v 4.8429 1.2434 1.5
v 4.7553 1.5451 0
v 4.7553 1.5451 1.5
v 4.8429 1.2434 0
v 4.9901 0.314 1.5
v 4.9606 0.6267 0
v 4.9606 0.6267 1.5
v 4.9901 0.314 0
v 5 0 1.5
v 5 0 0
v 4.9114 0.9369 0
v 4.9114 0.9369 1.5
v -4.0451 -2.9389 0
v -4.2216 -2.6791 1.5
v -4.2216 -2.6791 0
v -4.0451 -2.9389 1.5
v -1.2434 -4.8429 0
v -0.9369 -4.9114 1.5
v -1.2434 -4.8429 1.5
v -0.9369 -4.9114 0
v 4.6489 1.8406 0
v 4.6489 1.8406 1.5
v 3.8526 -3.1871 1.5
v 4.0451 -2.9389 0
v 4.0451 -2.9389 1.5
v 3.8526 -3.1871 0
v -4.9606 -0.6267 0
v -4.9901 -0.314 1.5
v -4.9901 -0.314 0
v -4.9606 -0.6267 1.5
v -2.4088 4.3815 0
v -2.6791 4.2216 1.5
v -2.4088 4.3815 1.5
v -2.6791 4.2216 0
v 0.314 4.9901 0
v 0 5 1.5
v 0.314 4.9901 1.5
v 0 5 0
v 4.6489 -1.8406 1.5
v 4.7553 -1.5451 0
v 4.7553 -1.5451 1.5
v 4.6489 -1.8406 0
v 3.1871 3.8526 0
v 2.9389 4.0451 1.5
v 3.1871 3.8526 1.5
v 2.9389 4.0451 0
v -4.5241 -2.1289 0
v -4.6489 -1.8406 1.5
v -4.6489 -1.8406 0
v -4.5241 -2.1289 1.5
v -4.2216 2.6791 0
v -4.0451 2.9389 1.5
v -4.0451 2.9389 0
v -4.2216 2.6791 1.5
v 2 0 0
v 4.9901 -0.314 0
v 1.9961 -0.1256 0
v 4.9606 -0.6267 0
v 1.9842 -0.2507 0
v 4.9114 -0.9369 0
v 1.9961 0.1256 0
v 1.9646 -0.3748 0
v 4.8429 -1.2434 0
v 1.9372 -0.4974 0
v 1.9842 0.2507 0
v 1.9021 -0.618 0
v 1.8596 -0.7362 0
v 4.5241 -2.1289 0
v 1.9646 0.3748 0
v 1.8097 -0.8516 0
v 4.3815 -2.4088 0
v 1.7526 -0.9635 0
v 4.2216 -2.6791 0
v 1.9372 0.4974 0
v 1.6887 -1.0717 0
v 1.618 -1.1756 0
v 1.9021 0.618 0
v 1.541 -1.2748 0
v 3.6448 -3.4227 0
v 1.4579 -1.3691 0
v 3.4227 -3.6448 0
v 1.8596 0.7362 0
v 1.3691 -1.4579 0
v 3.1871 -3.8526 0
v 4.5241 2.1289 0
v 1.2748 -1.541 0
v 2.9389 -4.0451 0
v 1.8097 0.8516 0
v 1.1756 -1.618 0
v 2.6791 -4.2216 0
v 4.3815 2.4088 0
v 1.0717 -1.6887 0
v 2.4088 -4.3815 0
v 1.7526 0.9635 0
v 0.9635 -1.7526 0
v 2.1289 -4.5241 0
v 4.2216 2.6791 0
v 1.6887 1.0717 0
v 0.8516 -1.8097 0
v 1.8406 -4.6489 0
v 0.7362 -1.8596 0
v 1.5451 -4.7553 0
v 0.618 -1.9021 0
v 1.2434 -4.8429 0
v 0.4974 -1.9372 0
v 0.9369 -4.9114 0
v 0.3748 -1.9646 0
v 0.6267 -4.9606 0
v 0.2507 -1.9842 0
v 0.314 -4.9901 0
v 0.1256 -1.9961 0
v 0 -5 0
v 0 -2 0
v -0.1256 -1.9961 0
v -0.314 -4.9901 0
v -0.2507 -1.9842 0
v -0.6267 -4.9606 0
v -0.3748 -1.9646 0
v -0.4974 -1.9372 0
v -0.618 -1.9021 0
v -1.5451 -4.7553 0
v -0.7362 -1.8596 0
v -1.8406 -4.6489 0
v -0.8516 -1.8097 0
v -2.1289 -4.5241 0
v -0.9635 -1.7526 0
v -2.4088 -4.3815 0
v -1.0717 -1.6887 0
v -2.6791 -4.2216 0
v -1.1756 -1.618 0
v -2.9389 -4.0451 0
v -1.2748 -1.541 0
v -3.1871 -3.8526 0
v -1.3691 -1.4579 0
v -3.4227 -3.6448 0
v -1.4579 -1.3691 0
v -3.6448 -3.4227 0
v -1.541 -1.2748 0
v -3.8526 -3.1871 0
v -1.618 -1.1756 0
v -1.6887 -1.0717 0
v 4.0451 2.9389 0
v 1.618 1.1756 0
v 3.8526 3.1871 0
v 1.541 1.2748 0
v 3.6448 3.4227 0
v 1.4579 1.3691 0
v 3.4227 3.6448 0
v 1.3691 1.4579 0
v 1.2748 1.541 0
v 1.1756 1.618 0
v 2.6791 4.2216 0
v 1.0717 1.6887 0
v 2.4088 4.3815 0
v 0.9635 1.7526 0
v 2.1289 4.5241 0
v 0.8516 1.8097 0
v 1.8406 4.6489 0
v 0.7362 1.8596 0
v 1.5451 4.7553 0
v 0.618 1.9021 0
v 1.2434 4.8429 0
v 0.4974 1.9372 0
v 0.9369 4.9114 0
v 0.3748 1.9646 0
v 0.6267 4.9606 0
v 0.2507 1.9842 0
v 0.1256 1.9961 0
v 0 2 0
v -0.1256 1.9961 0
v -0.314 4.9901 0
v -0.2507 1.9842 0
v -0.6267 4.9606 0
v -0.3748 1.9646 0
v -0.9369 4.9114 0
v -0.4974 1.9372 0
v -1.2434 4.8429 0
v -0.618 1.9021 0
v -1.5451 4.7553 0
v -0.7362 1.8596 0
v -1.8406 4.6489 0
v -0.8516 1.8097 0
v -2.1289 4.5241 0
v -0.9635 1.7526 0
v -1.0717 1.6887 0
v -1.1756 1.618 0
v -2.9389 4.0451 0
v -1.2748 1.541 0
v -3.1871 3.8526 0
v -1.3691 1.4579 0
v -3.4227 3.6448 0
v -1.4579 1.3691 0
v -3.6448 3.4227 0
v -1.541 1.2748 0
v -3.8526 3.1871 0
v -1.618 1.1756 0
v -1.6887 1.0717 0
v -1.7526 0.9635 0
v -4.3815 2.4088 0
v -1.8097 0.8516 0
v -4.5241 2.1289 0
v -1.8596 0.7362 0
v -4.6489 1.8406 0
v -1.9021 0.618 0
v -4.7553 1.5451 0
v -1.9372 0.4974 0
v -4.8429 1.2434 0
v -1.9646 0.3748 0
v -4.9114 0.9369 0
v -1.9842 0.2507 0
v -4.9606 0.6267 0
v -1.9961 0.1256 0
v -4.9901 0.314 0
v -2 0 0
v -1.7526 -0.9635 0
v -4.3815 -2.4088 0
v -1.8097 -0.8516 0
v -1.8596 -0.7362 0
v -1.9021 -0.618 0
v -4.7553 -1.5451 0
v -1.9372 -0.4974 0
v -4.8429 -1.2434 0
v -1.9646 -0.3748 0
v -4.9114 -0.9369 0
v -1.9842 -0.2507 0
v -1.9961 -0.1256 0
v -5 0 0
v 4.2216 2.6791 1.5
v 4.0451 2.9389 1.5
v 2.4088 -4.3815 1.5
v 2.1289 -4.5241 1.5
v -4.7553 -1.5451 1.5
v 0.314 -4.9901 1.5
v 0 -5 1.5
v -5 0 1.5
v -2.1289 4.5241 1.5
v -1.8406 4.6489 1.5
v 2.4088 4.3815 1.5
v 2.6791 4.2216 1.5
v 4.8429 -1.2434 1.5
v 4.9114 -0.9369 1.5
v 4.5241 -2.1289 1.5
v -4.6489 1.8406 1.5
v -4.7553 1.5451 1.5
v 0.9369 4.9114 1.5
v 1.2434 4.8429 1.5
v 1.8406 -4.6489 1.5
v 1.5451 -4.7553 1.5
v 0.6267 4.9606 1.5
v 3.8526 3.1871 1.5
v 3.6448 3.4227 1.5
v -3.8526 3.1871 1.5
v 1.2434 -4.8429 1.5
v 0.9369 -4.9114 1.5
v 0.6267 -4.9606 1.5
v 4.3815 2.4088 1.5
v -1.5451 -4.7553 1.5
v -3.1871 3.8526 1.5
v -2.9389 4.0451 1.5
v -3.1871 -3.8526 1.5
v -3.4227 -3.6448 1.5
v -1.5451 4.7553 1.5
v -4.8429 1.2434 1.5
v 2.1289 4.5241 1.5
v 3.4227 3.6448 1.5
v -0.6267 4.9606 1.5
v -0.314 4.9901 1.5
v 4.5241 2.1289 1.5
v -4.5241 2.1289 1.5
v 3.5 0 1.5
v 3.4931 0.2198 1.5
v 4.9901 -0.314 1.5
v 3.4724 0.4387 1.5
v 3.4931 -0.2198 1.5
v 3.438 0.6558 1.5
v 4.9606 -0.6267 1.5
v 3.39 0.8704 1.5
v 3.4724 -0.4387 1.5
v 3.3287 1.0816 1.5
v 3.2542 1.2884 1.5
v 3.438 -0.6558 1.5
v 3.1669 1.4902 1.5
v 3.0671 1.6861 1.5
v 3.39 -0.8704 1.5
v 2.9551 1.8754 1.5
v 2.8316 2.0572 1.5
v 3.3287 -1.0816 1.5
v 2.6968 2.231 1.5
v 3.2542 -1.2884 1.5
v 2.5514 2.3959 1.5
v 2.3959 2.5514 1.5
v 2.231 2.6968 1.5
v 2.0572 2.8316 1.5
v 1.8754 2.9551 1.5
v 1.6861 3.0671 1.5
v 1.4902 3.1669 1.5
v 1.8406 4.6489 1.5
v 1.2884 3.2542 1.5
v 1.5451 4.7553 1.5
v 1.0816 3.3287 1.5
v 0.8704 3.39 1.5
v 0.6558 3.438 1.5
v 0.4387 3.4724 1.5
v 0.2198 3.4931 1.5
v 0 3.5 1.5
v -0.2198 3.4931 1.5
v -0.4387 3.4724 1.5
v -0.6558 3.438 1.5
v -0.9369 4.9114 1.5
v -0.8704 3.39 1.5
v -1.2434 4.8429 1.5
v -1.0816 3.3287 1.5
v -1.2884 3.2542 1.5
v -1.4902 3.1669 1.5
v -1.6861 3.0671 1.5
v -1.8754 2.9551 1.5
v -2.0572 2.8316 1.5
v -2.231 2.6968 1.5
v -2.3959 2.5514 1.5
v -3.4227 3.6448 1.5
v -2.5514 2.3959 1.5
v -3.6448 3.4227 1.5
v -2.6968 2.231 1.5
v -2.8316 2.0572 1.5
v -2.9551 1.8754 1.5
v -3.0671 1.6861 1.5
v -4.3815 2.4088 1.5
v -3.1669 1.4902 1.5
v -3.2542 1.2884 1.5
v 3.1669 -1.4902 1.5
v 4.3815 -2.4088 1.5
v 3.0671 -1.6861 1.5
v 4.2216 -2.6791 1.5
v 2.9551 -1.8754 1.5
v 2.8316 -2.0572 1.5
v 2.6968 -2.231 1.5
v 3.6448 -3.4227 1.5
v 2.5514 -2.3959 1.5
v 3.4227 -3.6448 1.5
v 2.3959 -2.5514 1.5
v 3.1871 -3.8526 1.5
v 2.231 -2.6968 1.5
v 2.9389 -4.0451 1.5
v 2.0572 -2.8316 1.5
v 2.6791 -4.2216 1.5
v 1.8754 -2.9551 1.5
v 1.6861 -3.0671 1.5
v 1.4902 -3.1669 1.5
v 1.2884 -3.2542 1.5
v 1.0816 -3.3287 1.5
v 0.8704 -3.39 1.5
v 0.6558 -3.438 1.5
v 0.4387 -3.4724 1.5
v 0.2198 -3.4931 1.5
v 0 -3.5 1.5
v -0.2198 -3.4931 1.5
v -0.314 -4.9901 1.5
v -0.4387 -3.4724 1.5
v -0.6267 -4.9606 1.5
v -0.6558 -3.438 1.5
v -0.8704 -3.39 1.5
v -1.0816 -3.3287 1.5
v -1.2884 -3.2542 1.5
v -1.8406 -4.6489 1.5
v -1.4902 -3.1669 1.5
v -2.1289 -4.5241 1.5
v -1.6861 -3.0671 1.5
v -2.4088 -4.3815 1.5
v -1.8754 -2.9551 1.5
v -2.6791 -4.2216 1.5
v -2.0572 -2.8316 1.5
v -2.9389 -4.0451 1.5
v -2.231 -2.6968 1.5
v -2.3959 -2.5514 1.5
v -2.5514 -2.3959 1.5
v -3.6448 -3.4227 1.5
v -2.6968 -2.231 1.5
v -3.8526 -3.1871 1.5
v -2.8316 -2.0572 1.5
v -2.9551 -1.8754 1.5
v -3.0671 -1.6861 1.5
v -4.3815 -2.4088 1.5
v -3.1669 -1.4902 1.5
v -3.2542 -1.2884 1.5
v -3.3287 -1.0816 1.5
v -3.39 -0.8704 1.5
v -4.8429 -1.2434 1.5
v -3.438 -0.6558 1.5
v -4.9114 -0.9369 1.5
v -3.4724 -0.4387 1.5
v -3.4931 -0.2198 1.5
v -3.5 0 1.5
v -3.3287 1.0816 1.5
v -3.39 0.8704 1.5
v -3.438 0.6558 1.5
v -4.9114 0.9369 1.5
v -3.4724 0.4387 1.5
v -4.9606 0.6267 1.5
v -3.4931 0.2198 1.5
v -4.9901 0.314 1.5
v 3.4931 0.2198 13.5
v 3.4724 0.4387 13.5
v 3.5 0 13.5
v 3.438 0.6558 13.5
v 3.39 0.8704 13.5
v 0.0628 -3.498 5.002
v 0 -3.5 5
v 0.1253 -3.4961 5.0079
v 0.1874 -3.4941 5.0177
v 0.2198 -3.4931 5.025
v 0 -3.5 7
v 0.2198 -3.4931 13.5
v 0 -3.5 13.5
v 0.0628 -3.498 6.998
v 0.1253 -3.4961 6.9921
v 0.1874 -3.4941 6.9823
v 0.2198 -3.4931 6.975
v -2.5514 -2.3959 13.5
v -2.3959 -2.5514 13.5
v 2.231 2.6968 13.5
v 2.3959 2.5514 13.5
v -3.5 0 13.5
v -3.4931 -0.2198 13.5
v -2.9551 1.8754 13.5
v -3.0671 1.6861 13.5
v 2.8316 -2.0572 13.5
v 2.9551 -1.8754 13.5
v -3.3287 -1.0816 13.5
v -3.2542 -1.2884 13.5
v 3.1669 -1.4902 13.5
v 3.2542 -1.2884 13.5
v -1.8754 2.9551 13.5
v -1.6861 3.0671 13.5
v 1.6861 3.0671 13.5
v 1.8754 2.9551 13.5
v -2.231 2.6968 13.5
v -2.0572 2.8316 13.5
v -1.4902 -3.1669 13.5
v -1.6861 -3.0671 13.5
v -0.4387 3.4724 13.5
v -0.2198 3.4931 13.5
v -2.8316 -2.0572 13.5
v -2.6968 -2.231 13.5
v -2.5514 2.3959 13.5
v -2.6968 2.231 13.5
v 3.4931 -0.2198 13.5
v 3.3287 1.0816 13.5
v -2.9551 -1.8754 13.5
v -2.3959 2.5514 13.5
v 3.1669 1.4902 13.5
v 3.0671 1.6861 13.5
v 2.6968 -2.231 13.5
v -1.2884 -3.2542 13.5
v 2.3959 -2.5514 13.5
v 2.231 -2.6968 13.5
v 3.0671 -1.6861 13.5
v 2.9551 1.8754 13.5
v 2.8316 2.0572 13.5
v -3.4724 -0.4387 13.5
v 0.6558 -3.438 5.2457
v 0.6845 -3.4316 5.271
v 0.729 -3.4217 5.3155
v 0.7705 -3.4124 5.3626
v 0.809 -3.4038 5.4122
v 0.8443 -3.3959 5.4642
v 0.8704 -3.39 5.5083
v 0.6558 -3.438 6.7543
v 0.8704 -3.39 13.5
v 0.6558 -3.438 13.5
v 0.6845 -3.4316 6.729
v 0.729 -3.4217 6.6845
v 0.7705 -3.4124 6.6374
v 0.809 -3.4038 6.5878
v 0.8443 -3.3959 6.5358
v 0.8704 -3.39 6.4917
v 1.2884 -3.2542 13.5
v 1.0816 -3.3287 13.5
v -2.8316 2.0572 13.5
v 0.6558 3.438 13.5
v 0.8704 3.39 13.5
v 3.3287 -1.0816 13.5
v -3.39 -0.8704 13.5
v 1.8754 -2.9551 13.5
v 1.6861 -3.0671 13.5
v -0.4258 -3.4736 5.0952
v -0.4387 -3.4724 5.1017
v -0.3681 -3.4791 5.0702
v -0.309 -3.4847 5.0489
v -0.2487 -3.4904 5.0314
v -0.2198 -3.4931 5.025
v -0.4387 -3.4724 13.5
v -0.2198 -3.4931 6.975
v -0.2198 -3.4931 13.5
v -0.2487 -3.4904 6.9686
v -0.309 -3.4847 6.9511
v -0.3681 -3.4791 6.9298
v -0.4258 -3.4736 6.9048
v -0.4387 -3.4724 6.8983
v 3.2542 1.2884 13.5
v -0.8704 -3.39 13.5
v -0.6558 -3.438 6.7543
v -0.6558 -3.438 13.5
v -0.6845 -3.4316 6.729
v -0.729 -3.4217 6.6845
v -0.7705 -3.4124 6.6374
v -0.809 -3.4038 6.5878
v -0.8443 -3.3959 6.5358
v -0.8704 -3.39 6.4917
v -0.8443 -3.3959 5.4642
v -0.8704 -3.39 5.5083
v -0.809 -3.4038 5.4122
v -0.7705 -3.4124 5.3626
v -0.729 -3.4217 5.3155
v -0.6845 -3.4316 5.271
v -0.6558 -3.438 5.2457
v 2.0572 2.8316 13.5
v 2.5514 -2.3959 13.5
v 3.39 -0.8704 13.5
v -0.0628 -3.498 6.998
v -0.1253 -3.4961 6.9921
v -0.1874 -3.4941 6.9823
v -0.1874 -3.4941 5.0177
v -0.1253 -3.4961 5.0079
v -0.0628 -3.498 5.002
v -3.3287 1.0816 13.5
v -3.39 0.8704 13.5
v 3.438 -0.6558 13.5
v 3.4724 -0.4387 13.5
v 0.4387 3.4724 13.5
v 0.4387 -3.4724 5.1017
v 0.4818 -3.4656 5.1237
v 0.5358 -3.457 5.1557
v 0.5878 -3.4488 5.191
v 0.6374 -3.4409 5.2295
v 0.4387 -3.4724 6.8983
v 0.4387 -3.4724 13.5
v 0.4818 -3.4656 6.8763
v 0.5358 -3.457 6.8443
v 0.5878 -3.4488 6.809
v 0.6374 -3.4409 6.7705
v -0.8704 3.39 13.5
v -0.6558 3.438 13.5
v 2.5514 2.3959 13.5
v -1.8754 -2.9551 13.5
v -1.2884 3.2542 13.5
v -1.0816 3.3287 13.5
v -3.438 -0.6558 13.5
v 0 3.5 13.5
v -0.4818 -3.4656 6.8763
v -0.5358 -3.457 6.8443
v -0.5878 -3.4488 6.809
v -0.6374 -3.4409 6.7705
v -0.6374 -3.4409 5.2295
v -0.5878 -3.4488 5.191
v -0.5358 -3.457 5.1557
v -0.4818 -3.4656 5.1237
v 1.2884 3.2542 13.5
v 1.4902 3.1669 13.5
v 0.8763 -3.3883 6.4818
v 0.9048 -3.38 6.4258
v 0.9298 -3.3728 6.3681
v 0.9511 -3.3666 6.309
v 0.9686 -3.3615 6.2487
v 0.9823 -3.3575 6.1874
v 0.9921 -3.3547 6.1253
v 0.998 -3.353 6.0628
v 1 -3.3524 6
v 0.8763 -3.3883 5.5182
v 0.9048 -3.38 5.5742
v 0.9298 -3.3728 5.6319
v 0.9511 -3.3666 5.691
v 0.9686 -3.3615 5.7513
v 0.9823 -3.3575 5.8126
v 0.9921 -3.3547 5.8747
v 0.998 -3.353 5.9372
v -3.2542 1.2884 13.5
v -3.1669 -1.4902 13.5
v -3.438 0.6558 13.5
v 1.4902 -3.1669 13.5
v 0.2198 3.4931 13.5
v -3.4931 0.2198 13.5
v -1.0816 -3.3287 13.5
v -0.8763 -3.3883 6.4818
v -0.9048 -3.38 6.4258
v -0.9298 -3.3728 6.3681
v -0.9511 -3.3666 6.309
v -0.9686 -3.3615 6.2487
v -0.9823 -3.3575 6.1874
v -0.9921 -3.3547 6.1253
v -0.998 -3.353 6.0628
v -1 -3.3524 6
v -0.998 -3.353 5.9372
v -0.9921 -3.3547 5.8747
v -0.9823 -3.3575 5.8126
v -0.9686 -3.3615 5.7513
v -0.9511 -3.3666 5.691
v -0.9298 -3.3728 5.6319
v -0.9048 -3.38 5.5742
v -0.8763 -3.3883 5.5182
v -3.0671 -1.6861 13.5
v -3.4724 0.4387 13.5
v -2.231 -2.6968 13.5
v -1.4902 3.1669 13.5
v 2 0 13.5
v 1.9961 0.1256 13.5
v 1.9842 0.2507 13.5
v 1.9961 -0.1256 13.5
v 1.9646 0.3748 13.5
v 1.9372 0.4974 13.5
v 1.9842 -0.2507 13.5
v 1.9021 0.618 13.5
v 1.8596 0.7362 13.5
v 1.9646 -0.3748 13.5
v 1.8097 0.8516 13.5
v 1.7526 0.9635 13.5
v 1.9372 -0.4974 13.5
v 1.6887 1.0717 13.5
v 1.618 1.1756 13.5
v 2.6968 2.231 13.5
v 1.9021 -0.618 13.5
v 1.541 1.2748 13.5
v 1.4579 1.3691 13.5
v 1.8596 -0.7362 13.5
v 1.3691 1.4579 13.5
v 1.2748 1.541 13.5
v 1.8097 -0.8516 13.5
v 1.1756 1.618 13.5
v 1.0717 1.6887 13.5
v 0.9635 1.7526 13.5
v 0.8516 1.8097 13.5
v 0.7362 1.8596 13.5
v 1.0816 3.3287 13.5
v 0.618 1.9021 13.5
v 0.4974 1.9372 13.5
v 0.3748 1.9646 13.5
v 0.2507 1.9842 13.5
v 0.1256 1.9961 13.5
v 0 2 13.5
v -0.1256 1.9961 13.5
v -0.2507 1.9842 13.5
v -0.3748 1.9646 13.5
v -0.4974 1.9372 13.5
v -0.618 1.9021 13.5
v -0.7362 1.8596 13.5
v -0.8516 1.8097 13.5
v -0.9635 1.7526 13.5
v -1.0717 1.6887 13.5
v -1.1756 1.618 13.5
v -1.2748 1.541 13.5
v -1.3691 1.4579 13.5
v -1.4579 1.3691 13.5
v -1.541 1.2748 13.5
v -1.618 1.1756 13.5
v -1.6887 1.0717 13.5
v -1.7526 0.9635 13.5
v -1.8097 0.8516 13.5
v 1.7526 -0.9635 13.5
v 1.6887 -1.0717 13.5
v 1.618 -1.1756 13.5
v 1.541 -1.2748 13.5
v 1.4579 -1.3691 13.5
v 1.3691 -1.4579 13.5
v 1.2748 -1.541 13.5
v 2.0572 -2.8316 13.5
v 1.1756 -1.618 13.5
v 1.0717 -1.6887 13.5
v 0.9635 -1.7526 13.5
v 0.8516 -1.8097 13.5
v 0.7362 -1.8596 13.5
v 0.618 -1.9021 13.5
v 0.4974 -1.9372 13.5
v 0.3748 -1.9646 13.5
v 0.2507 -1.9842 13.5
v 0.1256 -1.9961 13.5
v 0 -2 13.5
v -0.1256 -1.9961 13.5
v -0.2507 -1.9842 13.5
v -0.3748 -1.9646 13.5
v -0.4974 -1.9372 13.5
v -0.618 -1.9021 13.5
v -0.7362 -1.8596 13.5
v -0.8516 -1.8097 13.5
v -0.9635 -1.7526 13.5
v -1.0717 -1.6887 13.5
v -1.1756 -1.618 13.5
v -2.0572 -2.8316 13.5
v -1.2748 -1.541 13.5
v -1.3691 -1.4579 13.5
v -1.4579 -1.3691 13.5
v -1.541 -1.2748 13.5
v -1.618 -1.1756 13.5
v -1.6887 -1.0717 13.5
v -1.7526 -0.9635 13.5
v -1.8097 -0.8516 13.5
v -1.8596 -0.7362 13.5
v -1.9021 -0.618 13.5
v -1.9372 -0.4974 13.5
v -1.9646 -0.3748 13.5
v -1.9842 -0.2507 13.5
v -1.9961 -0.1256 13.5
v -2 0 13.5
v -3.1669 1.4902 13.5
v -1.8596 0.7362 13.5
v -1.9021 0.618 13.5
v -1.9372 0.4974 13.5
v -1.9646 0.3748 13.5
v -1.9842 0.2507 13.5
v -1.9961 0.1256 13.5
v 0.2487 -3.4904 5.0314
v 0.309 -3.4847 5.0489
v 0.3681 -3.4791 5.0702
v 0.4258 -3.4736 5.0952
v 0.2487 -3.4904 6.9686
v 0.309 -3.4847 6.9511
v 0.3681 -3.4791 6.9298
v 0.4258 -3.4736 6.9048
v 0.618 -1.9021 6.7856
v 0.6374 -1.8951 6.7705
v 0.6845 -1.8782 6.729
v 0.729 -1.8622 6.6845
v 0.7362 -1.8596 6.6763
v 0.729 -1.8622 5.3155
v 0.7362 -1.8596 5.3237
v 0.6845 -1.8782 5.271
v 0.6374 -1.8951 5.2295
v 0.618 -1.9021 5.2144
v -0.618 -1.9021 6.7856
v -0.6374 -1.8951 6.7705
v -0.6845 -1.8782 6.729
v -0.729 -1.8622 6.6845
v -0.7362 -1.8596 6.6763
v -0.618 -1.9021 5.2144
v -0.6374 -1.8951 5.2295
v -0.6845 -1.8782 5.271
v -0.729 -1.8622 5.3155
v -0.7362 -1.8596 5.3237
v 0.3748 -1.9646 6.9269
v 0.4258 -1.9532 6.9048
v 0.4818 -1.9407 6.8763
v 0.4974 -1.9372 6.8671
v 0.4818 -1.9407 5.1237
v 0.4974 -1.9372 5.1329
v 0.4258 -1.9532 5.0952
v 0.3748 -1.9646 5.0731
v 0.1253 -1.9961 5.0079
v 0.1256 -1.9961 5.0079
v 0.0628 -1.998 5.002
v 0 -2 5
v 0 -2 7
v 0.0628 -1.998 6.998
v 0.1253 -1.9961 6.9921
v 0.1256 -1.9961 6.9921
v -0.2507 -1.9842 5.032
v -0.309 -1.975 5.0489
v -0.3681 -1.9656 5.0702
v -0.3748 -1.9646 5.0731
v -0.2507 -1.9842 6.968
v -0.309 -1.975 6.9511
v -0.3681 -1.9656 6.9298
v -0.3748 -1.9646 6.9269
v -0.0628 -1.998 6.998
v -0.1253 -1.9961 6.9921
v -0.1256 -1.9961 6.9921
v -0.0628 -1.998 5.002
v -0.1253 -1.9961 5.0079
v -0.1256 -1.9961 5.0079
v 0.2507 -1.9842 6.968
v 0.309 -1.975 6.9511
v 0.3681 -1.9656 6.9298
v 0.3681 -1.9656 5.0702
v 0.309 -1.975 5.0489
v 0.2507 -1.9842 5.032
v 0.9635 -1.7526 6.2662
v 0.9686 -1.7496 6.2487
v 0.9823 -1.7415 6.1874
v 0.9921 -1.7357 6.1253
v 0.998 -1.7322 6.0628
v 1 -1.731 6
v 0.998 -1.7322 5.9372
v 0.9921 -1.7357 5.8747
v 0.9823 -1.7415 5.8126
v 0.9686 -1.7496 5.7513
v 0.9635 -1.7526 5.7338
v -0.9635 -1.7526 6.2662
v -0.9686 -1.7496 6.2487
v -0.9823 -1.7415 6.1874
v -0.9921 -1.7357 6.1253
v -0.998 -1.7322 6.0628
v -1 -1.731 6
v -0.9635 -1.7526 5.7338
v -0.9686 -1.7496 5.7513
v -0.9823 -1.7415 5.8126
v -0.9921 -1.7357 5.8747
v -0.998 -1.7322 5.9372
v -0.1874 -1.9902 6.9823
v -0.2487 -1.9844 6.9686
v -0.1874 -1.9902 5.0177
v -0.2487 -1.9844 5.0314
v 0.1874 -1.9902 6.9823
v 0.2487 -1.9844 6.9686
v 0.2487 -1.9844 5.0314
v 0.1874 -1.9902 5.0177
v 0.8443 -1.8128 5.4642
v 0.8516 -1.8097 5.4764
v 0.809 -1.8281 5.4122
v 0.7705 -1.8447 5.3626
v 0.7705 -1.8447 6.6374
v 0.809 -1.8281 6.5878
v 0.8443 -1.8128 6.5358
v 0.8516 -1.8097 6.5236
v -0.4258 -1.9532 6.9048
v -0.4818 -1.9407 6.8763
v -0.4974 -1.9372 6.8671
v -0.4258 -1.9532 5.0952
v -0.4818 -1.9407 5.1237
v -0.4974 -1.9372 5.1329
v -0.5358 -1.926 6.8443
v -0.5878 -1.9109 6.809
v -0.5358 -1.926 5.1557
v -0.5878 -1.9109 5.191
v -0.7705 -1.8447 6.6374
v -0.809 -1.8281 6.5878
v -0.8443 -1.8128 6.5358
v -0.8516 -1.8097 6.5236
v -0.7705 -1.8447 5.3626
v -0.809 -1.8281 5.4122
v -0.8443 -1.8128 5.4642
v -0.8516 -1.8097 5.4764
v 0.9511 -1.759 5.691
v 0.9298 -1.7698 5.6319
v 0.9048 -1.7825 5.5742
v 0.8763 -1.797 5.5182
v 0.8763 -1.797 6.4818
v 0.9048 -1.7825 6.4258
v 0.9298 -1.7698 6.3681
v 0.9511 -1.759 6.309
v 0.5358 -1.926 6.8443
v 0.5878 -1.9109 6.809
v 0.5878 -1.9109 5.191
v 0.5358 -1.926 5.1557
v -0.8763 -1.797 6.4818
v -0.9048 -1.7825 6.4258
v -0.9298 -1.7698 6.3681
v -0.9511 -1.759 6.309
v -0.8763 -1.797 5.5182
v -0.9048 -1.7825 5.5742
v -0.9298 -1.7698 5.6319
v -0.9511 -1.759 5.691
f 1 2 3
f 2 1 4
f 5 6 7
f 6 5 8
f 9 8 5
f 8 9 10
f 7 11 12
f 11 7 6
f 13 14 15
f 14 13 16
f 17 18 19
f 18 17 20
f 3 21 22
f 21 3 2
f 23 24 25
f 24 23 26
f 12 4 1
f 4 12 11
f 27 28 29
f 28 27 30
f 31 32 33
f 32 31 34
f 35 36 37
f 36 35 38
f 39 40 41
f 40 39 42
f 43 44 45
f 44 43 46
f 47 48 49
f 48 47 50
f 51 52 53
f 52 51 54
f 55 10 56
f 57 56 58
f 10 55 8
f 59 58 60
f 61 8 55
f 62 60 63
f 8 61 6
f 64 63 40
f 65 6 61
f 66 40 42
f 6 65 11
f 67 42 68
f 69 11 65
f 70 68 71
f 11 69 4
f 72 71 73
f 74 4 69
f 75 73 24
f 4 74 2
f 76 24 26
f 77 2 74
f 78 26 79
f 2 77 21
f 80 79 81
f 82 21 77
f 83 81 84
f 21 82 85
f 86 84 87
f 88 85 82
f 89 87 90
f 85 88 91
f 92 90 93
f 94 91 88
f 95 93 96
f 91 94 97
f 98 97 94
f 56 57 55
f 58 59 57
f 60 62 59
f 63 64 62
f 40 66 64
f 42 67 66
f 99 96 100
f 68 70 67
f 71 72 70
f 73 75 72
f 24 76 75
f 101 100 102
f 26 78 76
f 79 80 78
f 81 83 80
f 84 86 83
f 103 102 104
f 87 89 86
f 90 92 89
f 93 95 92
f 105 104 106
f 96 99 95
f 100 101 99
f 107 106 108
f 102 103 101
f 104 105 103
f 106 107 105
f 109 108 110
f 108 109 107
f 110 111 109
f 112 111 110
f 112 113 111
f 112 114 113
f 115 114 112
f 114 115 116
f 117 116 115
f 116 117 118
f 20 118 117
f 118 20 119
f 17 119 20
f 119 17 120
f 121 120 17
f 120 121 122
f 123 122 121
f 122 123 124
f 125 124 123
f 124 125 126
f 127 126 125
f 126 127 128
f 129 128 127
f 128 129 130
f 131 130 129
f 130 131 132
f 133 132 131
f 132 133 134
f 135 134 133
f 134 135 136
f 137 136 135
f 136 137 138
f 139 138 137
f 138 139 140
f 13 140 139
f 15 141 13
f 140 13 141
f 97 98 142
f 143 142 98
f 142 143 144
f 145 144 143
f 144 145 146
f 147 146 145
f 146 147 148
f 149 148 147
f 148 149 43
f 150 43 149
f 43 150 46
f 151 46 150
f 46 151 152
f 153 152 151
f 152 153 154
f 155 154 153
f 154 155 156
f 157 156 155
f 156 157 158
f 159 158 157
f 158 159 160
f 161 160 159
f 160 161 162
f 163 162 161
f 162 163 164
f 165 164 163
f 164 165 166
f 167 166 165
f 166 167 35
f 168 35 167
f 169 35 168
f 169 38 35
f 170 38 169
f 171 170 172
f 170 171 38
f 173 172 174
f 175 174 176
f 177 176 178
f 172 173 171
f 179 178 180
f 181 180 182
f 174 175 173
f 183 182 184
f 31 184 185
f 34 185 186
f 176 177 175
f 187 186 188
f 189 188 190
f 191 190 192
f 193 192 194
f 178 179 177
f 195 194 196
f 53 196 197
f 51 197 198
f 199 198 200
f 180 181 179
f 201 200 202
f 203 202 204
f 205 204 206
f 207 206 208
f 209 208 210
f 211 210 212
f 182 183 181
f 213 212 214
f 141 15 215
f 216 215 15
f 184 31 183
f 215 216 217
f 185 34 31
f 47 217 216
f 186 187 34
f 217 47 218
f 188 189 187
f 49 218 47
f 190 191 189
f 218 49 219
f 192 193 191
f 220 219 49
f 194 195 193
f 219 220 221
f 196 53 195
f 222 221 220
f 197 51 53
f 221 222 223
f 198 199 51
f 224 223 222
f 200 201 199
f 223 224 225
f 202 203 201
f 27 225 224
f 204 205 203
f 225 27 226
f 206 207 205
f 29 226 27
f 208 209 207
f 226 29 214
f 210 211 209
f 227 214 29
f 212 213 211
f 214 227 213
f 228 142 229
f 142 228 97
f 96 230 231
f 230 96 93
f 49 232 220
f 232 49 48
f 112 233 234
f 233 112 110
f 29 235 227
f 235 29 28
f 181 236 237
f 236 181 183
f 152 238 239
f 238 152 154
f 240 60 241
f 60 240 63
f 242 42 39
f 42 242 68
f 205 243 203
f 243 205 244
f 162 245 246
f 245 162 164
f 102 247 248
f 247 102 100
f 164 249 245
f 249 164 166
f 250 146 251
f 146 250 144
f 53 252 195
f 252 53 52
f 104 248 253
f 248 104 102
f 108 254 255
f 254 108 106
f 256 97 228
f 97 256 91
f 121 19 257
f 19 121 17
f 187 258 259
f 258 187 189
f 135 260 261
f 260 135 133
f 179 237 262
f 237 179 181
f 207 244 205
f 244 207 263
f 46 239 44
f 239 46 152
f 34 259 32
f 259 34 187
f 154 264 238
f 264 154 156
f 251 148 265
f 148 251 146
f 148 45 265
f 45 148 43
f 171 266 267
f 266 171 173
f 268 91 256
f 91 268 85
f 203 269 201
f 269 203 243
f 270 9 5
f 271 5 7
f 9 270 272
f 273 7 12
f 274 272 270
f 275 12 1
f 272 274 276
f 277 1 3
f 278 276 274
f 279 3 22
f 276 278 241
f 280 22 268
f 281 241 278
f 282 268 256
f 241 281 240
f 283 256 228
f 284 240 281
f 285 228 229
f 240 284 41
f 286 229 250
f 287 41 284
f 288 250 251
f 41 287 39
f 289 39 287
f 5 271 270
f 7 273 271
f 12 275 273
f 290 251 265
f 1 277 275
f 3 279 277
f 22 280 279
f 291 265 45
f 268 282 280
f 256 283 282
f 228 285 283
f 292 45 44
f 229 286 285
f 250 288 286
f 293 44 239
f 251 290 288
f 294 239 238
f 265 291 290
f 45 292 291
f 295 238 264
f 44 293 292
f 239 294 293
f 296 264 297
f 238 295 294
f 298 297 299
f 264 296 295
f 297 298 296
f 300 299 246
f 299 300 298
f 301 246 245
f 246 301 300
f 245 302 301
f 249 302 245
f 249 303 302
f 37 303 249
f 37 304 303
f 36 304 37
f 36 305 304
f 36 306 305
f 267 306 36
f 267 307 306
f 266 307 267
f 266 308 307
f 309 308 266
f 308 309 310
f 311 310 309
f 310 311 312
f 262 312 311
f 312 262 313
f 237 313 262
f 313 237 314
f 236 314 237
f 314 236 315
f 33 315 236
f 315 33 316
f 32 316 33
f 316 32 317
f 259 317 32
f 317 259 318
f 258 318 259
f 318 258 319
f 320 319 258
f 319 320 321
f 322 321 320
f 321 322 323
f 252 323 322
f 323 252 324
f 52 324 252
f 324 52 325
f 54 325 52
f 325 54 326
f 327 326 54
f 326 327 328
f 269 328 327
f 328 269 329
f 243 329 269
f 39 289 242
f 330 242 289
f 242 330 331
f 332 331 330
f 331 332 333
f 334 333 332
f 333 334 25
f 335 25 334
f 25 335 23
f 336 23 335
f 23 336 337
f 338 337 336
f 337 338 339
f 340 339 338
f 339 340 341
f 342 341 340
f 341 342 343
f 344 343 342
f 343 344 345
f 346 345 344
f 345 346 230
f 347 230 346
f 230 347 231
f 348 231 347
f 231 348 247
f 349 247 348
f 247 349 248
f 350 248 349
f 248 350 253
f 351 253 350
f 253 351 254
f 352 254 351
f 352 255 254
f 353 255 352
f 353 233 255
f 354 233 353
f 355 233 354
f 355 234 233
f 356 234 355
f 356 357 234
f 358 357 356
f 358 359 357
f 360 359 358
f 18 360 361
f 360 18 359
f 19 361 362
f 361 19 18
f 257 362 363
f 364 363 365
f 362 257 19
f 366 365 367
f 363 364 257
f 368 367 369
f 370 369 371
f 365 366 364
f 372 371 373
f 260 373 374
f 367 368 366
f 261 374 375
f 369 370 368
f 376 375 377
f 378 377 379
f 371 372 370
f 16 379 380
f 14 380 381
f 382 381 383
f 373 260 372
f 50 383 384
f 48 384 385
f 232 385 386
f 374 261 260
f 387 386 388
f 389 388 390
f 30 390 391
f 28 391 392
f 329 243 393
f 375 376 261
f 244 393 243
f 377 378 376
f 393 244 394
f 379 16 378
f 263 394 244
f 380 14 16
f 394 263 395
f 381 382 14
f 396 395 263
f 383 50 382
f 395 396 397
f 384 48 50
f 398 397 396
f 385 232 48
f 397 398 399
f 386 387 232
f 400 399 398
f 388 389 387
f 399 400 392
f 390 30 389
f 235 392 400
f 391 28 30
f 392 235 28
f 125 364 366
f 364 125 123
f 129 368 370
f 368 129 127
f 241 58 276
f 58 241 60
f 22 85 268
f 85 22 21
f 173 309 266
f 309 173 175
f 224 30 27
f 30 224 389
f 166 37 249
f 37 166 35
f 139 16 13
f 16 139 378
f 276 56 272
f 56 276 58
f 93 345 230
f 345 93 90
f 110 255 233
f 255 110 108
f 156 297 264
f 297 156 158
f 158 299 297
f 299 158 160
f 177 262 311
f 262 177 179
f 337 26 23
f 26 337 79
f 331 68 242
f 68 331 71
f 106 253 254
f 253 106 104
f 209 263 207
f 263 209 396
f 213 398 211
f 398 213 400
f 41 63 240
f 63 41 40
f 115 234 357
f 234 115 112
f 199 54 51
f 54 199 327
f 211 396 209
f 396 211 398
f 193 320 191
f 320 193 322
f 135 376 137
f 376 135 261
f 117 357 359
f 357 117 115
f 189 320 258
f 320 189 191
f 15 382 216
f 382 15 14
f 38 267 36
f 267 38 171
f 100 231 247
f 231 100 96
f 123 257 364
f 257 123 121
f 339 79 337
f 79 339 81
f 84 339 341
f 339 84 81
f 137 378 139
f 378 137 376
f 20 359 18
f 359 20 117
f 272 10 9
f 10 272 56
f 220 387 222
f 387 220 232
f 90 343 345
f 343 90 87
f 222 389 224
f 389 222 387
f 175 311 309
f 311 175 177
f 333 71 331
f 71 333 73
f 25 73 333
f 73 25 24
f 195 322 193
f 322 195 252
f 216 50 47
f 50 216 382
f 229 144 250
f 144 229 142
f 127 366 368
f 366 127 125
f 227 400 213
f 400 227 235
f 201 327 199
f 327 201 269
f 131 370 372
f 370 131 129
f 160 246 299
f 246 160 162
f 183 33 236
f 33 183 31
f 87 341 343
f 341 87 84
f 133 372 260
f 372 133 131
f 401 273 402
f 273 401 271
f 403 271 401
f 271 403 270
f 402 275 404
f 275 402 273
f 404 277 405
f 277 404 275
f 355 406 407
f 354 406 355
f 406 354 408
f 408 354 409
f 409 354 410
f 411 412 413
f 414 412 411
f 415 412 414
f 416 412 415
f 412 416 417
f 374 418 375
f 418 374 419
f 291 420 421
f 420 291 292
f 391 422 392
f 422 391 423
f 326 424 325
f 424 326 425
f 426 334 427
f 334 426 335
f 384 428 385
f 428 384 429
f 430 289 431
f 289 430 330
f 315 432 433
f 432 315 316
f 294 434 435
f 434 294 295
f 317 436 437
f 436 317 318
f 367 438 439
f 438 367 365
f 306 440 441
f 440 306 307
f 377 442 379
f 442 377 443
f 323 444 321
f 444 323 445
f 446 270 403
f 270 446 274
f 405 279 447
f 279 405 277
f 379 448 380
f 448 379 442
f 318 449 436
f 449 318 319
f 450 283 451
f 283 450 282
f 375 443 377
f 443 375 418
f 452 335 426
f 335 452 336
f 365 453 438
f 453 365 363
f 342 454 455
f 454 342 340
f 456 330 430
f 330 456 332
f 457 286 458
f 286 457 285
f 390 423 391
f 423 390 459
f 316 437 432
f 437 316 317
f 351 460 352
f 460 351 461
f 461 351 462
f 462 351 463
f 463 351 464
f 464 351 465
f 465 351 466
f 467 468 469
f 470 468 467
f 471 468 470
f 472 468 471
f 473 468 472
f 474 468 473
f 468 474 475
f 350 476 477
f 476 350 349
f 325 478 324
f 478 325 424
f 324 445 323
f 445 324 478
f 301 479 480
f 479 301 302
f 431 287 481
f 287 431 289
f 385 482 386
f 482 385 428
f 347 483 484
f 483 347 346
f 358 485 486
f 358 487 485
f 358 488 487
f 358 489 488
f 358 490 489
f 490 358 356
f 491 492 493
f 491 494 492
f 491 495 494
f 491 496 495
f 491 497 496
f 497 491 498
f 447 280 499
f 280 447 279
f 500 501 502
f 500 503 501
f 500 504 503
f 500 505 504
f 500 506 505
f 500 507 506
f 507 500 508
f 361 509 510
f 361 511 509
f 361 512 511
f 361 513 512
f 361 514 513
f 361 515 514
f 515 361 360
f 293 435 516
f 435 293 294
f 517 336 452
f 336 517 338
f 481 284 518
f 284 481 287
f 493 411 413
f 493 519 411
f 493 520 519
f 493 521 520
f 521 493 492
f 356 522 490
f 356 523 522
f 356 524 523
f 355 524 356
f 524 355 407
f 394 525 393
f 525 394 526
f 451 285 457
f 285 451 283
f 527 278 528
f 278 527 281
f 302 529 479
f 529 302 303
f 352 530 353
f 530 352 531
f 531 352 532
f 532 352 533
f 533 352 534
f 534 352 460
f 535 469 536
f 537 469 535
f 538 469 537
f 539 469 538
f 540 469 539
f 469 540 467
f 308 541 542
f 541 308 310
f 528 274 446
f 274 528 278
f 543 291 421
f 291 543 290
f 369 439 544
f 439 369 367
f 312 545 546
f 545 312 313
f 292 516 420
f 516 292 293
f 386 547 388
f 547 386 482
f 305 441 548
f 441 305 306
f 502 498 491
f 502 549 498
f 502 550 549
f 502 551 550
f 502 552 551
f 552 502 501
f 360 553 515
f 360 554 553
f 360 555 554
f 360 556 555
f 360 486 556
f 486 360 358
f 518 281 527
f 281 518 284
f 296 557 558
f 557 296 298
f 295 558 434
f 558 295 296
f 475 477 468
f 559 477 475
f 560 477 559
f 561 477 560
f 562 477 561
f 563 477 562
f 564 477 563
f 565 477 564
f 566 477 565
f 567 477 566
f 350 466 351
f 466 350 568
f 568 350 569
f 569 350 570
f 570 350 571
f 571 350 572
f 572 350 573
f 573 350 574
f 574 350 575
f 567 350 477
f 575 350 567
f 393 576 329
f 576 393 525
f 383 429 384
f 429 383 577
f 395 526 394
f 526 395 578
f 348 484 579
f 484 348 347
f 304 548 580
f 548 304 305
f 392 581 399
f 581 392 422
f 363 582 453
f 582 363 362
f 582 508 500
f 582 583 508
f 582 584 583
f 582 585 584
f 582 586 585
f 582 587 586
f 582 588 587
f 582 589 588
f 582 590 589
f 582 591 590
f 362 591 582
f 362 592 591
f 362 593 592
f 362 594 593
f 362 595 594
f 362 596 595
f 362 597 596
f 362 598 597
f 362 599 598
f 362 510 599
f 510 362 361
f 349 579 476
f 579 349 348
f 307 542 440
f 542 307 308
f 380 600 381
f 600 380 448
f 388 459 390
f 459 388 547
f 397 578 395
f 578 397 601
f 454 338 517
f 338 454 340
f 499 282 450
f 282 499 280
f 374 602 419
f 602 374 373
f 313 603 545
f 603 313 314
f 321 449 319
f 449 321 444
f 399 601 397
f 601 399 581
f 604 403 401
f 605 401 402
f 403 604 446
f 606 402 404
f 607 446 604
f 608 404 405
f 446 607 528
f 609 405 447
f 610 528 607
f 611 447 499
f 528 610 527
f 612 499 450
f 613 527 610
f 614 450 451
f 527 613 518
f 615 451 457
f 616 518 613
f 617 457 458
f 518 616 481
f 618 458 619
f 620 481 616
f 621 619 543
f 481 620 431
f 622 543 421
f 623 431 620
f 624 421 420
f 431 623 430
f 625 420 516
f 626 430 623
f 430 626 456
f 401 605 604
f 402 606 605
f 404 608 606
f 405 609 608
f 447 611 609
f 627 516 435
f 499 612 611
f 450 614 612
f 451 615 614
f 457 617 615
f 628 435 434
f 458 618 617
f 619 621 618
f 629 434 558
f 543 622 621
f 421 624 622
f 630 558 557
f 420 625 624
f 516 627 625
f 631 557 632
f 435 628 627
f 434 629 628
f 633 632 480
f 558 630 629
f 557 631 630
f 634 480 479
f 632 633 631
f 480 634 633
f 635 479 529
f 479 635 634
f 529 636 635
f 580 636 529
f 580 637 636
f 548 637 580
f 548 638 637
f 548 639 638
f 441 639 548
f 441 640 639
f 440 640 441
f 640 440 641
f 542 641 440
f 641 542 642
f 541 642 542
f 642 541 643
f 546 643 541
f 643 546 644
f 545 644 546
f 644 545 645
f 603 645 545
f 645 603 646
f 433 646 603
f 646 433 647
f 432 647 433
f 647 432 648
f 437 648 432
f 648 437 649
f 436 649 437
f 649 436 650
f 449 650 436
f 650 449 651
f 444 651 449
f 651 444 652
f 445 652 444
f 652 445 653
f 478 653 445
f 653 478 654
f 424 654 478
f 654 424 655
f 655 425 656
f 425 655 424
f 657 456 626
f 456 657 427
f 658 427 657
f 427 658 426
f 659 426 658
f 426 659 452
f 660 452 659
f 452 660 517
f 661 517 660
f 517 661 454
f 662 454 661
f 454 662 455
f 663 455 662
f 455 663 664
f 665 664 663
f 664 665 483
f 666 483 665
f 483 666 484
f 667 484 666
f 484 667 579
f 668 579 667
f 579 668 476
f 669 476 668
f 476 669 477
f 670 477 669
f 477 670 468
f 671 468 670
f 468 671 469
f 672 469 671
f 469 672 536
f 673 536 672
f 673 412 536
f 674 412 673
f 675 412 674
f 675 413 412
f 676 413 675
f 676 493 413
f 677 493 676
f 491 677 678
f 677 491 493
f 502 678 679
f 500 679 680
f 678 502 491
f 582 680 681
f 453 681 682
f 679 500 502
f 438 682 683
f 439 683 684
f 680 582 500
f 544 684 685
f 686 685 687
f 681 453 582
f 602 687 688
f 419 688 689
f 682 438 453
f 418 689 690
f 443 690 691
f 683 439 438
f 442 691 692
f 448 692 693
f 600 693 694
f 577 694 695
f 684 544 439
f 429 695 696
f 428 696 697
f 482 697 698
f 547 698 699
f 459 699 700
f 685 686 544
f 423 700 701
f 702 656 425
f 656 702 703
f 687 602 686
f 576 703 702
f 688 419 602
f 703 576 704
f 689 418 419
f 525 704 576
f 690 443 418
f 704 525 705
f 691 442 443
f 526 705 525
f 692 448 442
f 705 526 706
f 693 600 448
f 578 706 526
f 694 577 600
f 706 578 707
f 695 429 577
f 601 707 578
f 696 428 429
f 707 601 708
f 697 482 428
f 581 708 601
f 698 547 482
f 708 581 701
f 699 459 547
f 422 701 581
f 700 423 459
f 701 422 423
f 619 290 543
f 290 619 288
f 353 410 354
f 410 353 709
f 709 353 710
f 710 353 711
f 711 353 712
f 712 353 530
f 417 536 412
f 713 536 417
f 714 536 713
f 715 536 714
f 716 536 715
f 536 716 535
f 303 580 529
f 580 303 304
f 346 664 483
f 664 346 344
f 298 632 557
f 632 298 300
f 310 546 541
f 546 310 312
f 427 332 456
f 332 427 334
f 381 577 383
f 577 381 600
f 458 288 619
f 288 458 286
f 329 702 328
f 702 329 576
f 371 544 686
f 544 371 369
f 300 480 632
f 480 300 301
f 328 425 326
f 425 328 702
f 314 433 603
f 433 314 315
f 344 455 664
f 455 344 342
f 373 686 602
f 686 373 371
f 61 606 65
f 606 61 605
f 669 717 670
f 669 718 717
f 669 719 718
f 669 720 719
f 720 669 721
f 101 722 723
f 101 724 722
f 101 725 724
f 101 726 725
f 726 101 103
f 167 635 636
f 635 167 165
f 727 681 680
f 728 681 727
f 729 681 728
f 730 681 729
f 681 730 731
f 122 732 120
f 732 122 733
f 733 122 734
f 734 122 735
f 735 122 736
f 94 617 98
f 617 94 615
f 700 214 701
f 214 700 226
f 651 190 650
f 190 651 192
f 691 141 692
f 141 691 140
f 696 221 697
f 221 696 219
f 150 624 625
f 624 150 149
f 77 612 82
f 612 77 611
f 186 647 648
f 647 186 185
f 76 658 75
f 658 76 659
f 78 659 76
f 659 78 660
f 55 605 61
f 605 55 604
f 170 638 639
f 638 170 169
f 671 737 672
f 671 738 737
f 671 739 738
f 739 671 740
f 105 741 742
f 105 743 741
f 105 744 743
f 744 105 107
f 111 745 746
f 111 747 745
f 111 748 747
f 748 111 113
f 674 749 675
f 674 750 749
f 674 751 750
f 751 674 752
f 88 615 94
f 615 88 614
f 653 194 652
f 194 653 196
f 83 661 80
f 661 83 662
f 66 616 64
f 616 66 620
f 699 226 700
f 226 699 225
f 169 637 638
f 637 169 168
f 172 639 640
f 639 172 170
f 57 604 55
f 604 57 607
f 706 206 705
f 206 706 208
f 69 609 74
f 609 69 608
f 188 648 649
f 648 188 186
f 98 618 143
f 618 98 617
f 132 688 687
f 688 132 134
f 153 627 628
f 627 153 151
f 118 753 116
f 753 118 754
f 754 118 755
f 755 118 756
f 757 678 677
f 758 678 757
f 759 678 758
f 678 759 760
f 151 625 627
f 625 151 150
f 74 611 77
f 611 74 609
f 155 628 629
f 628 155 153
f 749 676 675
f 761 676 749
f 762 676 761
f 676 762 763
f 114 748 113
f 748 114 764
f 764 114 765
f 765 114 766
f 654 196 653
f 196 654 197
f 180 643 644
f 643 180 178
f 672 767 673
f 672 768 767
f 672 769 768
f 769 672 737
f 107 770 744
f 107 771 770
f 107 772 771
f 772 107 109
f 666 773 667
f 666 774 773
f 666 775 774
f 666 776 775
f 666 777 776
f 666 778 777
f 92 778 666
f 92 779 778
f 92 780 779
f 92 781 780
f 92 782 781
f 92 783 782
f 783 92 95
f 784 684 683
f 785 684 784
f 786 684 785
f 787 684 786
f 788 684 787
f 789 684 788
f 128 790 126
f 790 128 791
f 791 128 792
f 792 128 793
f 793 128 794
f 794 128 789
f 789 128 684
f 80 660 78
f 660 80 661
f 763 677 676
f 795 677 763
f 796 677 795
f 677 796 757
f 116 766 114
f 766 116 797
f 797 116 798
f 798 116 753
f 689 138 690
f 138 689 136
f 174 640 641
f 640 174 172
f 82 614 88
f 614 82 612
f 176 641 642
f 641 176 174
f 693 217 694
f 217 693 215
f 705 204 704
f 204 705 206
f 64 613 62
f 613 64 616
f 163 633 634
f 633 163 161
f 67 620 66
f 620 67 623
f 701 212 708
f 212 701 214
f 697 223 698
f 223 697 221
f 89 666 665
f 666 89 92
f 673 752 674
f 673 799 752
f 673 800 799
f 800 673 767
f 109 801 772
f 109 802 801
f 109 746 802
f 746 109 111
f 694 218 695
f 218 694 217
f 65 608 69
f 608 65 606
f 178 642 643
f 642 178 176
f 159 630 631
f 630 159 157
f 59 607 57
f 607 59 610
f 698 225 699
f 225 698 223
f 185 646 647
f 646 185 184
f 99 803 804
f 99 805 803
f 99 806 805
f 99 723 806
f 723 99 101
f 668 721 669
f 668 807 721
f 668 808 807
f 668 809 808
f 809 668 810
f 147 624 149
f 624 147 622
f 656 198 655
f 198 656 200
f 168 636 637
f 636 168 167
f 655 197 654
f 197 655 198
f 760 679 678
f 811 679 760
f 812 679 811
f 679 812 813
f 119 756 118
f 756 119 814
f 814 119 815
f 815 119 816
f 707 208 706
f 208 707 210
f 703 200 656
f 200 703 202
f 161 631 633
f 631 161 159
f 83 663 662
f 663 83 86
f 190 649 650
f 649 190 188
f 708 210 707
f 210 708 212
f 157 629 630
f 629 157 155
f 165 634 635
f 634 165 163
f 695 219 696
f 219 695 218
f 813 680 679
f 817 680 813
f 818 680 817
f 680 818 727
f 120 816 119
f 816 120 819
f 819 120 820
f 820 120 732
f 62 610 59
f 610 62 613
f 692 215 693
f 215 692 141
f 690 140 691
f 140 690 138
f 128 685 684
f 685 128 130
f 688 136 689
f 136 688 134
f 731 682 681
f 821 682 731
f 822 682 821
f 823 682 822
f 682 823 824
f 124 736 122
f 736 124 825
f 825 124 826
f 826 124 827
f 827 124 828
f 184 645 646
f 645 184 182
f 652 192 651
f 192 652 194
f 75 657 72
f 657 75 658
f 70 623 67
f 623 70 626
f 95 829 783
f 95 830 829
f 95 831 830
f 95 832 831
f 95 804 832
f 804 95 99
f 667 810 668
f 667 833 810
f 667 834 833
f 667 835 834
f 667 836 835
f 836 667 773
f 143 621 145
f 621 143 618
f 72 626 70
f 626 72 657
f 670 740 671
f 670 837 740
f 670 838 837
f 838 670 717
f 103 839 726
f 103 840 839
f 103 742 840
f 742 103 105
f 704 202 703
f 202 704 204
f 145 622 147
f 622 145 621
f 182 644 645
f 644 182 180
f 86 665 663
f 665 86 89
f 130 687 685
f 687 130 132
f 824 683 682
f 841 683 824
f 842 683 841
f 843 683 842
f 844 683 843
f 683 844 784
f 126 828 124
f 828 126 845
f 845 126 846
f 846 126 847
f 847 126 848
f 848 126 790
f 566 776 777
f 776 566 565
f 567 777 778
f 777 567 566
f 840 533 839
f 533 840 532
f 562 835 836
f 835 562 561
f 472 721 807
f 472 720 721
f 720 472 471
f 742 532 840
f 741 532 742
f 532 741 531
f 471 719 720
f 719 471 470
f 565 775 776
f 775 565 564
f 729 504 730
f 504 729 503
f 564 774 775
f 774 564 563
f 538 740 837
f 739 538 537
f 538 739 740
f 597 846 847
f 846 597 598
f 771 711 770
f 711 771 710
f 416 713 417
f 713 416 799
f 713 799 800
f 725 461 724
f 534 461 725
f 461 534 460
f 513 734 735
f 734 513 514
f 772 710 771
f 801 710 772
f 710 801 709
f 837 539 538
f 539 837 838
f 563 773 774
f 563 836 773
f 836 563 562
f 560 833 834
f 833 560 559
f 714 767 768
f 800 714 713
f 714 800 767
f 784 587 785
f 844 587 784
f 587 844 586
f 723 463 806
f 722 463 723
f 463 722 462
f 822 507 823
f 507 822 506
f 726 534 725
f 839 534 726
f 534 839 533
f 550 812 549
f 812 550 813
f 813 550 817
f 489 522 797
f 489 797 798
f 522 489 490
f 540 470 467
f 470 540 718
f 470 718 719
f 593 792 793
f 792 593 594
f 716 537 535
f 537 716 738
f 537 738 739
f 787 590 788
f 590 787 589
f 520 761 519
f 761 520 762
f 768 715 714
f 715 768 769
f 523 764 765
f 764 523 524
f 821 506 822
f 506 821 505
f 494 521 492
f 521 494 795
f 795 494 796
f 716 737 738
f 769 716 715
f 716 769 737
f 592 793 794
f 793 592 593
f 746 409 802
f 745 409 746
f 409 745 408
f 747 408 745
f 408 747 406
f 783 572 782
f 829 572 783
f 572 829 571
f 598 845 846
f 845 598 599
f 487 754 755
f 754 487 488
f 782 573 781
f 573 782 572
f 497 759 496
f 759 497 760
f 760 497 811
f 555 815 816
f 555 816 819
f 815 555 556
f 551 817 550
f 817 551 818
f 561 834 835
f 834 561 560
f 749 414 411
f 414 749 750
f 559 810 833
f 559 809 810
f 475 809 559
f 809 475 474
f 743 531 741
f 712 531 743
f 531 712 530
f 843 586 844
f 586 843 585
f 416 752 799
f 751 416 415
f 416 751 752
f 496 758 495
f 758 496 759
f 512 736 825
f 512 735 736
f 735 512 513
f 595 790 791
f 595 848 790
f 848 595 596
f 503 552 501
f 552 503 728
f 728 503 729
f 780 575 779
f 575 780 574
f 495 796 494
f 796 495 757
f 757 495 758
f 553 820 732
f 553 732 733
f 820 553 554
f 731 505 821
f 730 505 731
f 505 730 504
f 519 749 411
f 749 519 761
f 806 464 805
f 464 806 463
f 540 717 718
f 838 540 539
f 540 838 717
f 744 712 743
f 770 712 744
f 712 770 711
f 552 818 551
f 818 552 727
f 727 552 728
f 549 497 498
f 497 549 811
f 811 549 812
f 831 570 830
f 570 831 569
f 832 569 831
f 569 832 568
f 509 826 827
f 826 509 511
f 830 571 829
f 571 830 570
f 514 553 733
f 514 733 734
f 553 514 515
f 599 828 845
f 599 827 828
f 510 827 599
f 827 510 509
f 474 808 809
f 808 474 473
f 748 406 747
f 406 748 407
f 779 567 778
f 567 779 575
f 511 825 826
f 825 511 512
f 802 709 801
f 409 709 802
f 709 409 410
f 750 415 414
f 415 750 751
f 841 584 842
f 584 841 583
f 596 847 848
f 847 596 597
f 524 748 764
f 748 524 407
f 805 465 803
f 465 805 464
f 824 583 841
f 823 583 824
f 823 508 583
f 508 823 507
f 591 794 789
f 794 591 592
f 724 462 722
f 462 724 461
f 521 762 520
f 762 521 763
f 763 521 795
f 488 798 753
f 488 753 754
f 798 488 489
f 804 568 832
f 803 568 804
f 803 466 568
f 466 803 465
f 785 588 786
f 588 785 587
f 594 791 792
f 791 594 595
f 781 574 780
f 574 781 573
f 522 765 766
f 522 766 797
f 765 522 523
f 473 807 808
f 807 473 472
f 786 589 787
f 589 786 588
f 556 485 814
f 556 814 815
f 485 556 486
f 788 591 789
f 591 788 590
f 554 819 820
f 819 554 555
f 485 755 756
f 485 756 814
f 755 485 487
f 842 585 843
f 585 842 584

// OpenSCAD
//number of fragments
$fn=100;//[25,50,100,150,200]
//height of the bushing lip
lip_height=1.5;
//diameter of the bushing lip
lip_diameter=10;
//height of the bushing barrel
barrel_height=12;
//outer diameter of the bushing barrel
barrel_diameter=7;
//inner diameter of the bushing
inner_diameter=4;
//set screw hole diameter
set_screw_diameter=2;
//set screw hole height
set_screw_height=6;
//number of set screw holes
set_screw_holes=1;//[0,1,2,4]
difference(){
    difference(){
        union(){
            //lip
            cylinder(h=lip_height,d=lip_diameter);
            //barrel
            translate([0,0,lip_height]){
                cylinder(h=barrel_height,d=barrel_diameter);
                }
            }

    //inner diameter
    cylinder(h=(barrel_height+lip_height),d=inner_diameter);
    }
    if (set_screw_holes == 1){
        translate([0,0,set_screw_height]){
            rotate([90,0,0]){
                cylinder(h=(barrel_diameter/2),d=set_screw_diameter);
            }
        }
    }
    if (set_screw_holes == 2){
        translate([0,(barrel_diameter/2),set_screw_height]){
            rotate([90,0,0]){
                cylinder(h=barrel_diameter,d=set_screw_diameter);
            }
        }
    }
    if (set_screw_holes == 3){
        translate([0,(barrel_diameter/2),set_screw_height]){
            rotate([90,0,0]){
                cylinder(h=barrel_diameter,d=set_screw_diameter);
            }
        }
    }
    if (set_screw_holes == 4){
        union(){
            translate([0,(barrel_diameter/2),set_screw_height]){
                rotate([90,0,0]){
                    cylinder(h=barrel_diameter,d=set_screw_diameter);
                }
            }
            translate([-(barrel_diameter/2),0,set_screw_height]){
                rotate([90,0,90]){
                    cylinder(h=barrel_diameter,d=set_screw_diameter);
                }
            }
        }
    }
}
